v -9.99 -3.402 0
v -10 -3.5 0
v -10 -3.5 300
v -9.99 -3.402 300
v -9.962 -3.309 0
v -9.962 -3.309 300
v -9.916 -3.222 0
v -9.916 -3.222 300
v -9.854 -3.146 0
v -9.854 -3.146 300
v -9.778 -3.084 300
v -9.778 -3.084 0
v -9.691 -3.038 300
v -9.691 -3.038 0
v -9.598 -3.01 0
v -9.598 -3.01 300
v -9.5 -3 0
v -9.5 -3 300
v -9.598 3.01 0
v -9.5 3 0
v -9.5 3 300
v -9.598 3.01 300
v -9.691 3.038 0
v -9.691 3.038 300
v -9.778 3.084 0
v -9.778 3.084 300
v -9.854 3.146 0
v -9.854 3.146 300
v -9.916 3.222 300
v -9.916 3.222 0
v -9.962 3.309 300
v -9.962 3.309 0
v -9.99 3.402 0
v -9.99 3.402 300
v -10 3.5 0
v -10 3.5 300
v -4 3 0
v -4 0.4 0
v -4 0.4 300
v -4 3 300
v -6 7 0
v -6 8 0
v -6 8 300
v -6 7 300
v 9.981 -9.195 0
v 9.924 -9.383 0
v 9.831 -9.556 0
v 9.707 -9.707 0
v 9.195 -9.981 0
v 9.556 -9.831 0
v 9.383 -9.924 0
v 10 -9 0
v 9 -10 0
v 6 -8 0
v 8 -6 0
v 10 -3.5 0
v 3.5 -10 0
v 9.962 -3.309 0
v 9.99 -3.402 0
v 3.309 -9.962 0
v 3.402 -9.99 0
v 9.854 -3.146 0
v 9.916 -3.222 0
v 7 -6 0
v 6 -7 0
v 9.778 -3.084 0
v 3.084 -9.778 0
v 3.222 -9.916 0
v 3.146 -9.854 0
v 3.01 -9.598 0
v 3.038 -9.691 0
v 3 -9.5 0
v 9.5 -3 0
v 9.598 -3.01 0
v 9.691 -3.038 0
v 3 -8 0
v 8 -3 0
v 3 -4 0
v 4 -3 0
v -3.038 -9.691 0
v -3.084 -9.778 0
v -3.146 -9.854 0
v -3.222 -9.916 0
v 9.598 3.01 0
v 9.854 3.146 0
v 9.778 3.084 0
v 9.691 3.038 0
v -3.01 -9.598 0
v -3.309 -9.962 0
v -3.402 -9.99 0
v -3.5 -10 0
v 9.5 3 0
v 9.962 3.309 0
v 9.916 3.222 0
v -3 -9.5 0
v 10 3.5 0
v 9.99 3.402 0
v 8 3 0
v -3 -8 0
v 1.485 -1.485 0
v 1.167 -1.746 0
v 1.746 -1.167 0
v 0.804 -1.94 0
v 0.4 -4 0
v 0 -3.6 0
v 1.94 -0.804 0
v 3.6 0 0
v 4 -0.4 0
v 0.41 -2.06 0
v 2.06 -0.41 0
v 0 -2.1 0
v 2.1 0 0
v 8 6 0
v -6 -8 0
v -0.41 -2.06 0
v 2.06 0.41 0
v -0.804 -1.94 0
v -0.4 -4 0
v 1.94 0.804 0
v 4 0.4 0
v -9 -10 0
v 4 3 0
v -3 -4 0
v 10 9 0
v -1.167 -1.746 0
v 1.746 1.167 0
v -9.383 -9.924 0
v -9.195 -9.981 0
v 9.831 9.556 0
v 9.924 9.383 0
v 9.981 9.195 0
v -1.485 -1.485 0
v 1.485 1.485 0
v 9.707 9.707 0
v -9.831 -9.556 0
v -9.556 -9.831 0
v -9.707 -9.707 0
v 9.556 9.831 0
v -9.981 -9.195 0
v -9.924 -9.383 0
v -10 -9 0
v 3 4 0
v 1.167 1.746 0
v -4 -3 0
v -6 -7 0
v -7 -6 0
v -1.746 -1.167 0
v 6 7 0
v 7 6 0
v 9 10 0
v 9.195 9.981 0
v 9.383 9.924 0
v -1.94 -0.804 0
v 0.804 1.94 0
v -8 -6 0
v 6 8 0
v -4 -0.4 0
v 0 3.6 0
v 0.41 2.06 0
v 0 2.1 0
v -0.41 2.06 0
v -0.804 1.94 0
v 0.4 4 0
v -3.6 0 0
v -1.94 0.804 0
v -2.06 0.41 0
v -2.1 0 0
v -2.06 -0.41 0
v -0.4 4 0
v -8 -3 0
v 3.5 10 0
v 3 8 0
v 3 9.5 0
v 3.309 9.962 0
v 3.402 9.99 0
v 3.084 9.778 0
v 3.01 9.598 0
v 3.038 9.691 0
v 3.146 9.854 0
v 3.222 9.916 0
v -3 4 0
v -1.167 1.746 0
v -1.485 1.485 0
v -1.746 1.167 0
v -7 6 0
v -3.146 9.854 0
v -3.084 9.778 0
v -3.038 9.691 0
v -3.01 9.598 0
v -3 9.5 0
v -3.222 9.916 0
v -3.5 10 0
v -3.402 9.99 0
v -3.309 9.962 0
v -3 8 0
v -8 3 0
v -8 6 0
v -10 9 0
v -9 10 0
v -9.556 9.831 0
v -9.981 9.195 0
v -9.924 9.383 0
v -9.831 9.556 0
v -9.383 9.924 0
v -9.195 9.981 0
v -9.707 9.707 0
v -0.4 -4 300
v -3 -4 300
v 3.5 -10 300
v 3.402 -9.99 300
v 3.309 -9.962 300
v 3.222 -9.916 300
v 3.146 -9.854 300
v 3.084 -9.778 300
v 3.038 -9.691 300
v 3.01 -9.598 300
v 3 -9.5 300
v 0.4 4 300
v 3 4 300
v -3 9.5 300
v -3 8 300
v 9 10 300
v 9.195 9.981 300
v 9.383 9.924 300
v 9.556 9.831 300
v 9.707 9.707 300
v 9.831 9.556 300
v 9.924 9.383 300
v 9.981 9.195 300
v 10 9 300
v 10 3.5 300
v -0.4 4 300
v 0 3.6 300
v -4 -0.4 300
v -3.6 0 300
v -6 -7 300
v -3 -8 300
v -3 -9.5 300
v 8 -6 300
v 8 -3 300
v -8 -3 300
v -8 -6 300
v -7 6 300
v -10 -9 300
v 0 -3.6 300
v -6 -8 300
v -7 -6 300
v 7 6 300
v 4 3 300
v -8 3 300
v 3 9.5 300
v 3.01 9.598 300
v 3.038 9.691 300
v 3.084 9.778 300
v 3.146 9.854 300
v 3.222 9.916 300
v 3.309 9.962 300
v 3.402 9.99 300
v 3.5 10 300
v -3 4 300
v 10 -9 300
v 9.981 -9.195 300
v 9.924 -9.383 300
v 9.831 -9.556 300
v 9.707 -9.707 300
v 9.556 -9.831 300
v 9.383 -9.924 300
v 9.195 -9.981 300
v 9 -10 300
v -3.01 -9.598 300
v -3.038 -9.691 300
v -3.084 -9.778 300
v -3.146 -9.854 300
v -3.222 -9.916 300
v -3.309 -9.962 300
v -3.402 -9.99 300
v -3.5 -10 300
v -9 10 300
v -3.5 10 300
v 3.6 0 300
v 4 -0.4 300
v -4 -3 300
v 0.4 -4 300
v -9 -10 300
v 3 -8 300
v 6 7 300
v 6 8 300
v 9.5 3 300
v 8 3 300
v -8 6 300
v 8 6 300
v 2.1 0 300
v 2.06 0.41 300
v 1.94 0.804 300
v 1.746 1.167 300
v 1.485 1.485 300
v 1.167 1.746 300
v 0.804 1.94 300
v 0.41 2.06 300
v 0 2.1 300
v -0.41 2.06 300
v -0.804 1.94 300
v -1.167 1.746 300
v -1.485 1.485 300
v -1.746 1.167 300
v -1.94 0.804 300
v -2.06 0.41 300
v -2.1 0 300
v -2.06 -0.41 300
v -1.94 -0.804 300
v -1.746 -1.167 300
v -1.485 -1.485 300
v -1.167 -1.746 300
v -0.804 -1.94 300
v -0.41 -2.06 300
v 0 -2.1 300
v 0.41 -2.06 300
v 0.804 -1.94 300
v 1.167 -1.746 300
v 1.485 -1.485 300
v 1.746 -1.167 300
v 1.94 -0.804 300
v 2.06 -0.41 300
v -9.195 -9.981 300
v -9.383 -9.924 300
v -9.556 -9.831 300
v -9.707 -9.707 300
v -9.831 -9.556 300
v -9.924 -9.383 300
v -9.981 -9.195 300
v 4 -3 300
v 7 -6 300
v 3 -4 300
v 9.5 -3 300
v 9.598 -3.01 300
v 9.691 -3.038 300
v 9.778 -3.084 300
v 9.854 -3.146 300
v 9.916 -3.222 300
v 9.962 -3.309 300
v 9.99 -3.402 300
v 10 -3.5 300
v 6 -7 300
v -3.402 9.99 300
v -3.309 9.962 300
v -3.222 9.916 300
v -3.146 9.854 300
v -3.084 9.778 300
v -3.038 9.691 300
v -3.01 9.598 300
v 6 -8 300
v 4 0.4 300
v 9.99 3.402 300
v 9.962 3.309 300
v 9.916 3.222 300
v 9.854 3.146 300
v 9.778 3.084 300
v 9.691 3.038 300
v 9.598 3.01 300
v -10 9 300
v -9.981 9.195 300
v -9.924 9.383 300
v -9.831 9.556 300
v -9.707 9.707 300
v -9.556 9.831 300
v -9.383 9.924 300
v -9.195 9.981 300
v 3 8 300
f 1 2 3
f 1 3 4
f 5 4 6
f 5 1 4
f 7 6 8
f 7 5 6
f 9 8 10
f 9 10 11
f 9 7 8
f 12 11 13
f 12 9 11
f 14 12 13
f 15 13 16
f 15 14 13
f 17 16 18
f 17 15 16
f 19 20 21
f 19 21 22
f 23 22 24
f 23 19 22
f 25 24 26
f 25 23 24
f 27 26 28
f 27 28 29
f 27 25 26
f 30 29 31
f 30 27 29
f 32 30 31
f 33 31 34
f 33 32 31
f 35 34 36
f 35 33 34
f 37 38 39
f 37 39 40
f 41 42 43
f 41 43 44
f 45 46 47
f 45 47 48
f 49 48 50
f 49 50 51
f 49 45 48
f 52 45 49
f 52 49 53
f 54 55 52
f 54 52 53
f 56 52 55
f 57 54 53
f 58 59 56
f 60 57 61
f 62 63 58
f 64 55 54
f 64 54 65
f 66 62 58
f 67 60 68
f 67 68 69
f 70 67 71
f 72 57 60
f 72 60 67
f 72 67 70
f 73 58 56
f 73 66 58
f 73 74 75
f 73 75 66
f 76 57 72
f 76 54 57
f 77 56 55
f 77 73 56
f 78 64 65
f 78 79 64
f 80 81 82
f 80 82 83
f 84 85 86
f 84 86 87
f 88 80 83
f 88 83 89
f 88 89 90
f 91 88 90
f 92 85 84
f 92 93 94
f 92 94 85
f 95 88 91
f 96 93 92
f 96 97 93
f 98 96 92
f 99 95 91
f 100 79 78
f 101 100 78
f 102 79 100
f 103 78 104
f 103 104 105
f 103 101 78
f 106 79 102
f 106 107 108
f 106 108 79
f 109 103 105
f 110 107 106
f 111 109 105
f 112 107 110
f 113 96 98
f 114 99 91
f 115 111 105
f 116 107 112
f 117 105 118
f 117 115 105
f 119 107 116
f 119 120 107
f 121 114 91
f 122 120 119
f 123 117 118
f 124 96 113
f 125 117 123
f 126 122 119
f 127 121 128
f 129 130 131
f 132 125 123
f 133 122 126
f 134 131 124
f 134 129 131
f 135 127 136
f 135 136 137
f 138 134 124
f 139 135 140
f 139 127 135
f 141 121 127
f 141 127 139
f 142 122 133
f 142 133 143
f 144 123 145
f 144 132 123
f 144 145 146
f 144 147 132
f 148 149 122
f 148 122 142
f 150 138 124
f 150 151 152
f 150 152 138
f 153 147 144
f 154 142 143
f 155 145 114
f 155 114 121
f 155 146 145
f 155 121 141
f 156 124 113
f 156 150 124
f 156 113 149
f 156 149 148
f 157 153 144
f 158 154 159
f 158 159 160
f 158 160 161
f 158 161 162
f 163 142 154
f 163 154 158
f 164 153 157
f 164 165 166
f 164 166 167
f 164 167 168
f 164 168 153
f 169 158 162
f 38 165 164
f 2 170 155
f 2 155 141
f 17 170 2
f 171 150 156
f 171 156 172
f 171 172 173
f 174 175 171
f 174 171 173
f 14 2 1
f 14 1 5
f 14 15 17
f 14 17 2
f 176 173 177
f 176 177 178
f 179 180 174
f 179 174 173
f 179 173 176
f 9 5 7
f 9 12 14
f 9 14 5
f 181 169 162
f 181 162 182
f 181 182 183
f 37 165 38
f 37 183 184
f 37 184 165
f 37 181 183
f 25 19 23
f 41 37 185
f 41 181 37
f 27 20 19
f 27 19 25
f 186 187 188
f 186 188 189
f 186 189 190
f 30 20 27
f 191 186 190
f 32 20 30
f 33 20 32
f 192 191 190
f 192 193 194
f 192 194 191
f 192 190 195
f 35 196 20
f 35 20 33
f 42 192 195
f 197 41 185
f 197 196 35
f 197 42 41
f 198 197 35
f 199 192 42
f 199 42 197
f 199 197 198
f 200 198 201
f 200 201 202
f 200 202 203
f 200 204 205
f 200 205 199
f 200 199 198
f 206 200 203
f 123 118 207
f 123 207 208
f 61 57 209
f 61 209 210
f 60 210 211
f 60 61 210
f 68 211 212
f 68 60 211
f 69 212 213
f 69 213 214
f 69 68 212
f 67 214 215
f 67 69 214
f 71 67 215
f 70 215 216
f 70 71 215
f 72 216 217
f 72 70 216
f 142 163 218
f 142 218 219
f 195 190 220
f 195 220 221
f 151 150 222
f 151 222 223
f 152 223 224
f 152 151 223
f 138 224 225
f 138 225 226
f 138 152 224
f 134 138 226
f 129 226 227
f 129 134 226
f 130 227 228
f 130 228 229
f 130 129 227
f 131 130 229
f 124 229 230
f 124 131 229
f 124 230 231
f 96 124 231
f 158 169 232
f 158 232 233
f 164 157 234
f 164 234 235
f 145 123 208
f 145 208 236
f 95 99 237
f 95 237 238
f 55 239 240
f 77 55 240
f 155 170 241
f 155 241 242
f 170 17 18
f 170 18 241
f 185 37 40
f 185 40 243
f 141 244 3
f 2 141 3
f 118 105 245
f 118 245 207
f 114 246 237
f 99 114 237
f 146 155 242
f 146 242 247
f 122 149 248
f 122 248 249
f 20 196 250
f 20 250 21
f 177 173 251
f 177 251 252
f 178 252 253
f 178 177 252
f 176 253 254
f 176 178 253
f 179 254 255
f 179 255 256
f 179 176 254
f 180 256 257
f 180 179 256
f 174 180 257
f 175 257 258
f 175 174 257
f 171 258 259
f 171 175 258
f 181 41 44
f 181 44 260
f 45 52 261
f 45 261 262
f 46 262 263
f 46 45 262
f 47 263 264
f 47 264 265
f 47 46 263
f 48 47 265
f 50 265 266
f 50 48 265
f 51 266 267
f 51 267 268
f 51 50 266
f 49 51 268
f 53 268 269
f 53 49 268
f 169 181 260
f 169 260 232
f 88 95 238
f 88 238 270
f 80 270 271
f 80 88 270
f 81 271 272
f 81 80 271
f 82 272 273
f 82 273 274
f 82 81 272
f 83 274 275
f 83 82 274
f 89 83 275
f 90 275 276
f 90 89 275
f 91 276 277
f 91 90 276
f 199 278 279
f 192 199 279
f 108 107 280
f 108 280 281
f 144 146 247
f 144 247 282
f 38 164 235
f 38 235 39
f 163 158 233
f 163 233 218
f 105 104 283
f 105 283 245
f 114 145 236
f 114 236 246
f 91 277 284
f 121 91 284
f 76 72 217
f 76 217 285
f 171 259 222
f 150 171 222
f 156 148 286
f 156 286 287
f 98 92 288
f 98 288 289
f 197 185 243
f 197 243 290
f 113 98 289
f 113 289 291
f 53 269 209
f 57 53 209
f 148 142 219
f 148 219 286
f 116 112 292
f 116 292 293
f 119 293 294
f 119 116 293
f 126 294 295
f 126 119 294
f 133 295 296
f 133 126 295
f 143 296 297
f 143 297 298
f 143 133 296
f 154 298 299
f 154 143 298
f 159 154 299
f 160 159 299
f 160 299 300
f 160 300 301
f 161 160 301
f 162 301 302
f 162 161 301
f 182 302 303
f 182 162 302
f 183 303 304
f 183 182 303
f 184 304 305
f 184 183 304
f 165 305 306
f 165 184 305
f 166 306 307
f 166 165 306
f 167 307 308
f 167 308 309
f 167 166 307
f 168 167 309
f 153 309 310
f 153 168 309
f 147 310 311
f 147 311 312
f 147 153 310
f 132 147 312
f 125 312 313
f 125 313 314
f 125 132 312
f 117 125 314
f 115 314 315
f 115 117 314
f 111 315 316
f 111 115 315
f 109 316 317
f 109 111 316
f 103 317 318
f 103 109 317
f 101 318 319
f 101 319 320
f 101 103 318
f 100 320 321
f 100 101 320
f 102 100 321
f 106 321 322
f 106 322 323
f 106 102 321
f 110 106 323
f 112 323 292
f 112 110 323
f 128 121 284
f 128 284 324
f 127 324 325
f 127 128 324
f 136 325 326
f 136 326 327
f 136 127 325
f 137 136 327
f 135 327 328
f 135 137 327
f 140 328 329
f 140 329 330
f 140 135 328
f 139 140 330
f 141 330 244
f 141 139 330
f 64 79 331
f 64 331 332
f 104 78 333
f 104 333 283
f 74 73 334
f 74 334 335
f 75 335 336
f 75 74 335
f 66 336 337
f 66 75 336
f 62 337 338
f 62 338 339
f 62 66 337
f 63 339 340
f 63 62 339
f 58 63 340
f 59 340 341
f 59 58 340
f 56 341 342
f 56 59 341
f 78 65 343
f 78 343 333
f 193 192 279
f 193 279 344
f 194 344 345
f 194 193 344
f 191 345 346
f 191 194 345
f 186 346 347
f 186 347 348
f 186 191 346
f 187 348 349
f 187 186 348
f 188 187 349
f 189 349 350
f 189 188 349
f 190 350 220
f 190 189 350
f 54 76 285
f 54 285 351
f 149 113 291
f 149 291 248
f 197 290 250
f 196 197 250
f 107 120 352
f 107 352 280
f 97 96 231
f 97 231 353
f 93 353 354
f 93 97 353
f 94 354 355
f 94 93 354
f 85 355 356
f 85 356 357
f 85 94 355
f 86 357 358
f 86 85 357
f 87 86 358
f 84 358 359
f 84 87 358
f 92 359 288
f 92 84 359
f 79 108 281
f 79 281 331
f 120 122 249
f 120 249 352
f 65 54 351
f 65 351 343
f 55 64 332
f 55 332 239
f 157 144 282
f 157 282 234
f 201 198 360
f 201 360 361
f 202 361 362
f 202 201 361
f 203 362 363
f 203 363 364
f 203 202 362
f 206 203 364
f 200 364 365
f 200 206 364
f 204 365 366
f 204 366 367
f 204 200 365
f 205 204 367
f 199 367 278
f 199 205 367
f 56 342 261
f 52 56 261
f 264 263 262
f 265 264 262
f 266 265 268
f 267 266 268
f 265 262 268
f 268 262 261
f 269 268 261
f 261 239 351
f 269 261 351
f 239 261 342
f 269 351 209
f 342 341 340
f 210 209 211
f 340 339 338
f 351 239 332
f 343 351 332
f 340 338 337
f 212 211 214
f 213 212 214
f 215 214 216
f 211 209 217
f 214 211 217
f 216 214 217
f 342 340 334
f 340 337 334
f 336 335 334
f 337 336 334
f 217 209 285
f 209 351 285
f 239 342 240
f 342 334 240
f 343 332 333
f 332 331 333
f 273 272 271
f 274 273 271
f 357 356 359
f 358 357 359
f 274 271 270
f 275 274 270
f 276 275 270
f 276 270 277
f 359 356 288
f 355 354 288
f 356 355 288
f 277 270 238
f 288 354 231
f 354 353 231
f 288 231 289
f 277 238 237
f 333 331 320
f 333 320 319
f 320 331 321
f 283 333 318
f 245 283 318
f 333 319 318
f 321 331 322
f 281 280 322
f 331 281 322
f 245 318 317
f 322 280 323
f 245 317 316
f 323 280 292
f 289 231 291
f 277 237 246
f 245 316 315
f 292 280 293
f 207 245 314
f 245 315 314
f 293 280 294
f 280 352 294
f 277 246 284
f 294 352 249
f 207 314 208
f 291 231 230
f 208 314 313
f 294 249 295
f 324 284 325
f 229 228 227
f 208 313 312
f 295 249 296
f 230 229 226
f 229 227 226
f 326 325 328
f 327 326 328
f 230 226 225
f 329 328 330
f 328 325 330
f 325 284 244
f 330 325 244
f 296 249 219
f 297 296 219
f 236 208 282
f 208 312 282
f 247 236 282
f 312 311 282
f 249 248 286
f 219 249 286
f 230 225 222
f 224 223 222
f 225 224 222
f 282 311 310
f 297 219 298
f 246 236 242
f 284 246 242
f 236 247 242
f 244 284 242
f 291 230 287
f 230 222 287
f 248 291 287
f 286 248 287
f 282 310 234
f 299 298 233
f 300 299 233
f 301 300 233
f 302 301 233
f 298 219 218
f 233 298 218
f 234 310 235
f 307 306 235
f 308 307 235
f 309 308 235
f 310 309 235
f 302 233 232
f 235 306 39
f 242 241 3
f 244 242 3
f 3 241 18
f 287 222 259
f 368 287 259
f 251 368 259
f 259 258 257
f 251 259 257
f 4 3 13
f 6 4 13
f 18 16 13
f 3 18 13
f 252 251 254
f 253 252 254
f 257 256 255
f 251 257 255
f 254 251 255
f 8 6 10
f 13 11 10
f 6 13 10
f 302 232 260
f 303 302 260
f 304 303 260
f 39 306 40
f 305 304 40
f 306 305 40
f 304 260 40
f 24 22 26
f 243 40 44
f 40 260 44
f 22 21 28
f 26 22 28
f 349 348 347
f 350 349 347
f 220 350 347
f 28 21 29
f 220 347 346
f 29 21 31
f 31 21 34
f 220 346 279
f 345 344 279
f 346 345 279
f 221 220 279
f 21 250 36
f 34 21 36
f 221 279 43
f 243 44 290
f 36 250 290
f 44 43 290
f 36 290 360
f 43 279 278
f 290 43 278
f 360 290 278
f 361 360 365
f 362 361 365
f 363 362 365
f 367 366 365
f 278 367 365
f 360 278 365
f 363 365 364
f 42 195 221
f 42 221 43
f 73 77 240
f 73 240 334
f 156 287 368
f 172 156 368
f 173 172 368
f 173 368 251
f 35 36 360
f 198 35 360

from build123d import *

# Parameters (mm, degrees)
SCHIZZO1_R                   = 2.1
ESTRUSIONE_ESTRUSIONE1_DEPTH = 300


with BuildPart() as part:
    # Schizzo1 → Estrusione-Estrusione1 (new body)
    with BuildSketch(Plane.XY):
        with BuildLine():
            Line((-3.6, 0), (-4, 0.4))
            Line((-4, 0.4), (-4, 3))
            Line((-4, 3), (-7, 6))
            Line((-7, 6), (-8, 6))
            Line((-8, 6), (-8, 3))
            Line((-8, 3), (-9.5, 3))
            ThreePointArc((-9.5, 3), (-9.853553391, 3.146446609), (-10, 3.5))
            Line((-10, 3.5), (-10, 9))
            ThreePointArc((-10, 9), (-9.707106781, 9.707106781), (-9, 10))
            Line((-9, 10), (-3.5, 10))
            ThreePointArc((-3.5, 10), (-3.146446609, 9.853553391), (-3, 9.5))
            Line((-3, 9.5), (-3, 8))
            Line((-3, 8), (-6, 8))
            Line((-6, 8), (-6, 7))
            Line((-6, 7), (-3, 4))
            Line((-3, 4), (-0.4, 4))
            Line((-0.4, 4), (0, 3.6))
            Line((0, 3.6), (0.4, 4))
            Line((0.4, 4), (3, 4))
            Line((3, 4), (6, 7))
            Line((6, 7), (6, 8))
            Line((6, 8), (3, 8))
            Line((3, 8), (3, 9.5))
            ThreePointArc((3, 9.5), (3.146446609, 9.853553391), (3.5, 10))
            Line((3.5, 10), (9, 10))
            ThreePointArc((9, 10), (9.707106781, 9.707106781), (10, 9))
            Line((10, 9), (10, 3.5))
            ThreePointArc((10, 3.5), (9.853553391, 3.146446609), (9.5, 3))
            Line((9.5, 3), (8, 3))
            Line((8, 3), (8, 6))
            Line((8, 6), (7, 6))
            Line((7, 6), (4, 3))
            Line((4, 3), (4, 0.4))
            Line((4, 0.4), (3.6, 0))
            Line((3.6, 0), (4, -0.4))
            Line((4, -0.4), (4, -3))
            Line((4, -3), (7, -6))
            Line((7, -6), (8, -6))
            Line((8, -6), (8, -3))
            Line((8, -3), (9.5, -3))
            ThreePointArc((9.5, -3), (9.853553391, -3.146446609), (10, -3.5))
            Line((10, -3.5), (10, -9))
            ThreePointArc((10, -9), (9.707106781, -9.707106781), (9, -10))
            Line((9, -10), (3.5, -10))
            ThreePointArc((3.5, -10), (3.146446609, -9.853553391), (3, -9.5))
            Line((3, -9.5), (3, -8))
            Line((3, -8), (6, -8))
            Line((6, -8), (6, -7))
            Line((6, -7), (3, -4))
            Line((3, -4), (0.4, -4))
            Line((0.4, -4), (0, -3.6))
            Line((0, -3.6), (-0.4, -4))
            Line((-0.4, -4), (-3, -4))
            Line((-3, -4), (-6, -7))
            Line((-6, -7), (-6, -8))
            Line((-6, -8), (-3, -8))
            Line((-3, -8), (-3, -9.5))
            ThreePointArc((-3, -9.5), (-3.146446609, -9.853553391), (-3.5, -10))
            Line((-3.5, -10), (-9, -10))
            ThreePointArc((-9, -10), (-9.707106781, -9.707106781), (-10, -9))
            Line((-10, -9), (-10, -3.5))
            ThreePointArc((-10, -3.5), (-9.853553391, -3.146446609), (-9.5, -3))
            Line((-9.5, -3), (-8, -3))
            Line((-8, -3), (-8, -6))
            Line((-8, -6), (-7, -6))
            Line((-7, -6), (-4, -3))
            Line((-4, -3), (-4, -0.4))
            Line((-4, -0.4), (-3.6, 0))
        make_face()
        Circle(SCHIZZO1_R, mode=Mode.SUBTRACT)
    extrude(amount=ESTRUSIONE_ESTRUSIONE1_DEPTH)


solid = part.part
